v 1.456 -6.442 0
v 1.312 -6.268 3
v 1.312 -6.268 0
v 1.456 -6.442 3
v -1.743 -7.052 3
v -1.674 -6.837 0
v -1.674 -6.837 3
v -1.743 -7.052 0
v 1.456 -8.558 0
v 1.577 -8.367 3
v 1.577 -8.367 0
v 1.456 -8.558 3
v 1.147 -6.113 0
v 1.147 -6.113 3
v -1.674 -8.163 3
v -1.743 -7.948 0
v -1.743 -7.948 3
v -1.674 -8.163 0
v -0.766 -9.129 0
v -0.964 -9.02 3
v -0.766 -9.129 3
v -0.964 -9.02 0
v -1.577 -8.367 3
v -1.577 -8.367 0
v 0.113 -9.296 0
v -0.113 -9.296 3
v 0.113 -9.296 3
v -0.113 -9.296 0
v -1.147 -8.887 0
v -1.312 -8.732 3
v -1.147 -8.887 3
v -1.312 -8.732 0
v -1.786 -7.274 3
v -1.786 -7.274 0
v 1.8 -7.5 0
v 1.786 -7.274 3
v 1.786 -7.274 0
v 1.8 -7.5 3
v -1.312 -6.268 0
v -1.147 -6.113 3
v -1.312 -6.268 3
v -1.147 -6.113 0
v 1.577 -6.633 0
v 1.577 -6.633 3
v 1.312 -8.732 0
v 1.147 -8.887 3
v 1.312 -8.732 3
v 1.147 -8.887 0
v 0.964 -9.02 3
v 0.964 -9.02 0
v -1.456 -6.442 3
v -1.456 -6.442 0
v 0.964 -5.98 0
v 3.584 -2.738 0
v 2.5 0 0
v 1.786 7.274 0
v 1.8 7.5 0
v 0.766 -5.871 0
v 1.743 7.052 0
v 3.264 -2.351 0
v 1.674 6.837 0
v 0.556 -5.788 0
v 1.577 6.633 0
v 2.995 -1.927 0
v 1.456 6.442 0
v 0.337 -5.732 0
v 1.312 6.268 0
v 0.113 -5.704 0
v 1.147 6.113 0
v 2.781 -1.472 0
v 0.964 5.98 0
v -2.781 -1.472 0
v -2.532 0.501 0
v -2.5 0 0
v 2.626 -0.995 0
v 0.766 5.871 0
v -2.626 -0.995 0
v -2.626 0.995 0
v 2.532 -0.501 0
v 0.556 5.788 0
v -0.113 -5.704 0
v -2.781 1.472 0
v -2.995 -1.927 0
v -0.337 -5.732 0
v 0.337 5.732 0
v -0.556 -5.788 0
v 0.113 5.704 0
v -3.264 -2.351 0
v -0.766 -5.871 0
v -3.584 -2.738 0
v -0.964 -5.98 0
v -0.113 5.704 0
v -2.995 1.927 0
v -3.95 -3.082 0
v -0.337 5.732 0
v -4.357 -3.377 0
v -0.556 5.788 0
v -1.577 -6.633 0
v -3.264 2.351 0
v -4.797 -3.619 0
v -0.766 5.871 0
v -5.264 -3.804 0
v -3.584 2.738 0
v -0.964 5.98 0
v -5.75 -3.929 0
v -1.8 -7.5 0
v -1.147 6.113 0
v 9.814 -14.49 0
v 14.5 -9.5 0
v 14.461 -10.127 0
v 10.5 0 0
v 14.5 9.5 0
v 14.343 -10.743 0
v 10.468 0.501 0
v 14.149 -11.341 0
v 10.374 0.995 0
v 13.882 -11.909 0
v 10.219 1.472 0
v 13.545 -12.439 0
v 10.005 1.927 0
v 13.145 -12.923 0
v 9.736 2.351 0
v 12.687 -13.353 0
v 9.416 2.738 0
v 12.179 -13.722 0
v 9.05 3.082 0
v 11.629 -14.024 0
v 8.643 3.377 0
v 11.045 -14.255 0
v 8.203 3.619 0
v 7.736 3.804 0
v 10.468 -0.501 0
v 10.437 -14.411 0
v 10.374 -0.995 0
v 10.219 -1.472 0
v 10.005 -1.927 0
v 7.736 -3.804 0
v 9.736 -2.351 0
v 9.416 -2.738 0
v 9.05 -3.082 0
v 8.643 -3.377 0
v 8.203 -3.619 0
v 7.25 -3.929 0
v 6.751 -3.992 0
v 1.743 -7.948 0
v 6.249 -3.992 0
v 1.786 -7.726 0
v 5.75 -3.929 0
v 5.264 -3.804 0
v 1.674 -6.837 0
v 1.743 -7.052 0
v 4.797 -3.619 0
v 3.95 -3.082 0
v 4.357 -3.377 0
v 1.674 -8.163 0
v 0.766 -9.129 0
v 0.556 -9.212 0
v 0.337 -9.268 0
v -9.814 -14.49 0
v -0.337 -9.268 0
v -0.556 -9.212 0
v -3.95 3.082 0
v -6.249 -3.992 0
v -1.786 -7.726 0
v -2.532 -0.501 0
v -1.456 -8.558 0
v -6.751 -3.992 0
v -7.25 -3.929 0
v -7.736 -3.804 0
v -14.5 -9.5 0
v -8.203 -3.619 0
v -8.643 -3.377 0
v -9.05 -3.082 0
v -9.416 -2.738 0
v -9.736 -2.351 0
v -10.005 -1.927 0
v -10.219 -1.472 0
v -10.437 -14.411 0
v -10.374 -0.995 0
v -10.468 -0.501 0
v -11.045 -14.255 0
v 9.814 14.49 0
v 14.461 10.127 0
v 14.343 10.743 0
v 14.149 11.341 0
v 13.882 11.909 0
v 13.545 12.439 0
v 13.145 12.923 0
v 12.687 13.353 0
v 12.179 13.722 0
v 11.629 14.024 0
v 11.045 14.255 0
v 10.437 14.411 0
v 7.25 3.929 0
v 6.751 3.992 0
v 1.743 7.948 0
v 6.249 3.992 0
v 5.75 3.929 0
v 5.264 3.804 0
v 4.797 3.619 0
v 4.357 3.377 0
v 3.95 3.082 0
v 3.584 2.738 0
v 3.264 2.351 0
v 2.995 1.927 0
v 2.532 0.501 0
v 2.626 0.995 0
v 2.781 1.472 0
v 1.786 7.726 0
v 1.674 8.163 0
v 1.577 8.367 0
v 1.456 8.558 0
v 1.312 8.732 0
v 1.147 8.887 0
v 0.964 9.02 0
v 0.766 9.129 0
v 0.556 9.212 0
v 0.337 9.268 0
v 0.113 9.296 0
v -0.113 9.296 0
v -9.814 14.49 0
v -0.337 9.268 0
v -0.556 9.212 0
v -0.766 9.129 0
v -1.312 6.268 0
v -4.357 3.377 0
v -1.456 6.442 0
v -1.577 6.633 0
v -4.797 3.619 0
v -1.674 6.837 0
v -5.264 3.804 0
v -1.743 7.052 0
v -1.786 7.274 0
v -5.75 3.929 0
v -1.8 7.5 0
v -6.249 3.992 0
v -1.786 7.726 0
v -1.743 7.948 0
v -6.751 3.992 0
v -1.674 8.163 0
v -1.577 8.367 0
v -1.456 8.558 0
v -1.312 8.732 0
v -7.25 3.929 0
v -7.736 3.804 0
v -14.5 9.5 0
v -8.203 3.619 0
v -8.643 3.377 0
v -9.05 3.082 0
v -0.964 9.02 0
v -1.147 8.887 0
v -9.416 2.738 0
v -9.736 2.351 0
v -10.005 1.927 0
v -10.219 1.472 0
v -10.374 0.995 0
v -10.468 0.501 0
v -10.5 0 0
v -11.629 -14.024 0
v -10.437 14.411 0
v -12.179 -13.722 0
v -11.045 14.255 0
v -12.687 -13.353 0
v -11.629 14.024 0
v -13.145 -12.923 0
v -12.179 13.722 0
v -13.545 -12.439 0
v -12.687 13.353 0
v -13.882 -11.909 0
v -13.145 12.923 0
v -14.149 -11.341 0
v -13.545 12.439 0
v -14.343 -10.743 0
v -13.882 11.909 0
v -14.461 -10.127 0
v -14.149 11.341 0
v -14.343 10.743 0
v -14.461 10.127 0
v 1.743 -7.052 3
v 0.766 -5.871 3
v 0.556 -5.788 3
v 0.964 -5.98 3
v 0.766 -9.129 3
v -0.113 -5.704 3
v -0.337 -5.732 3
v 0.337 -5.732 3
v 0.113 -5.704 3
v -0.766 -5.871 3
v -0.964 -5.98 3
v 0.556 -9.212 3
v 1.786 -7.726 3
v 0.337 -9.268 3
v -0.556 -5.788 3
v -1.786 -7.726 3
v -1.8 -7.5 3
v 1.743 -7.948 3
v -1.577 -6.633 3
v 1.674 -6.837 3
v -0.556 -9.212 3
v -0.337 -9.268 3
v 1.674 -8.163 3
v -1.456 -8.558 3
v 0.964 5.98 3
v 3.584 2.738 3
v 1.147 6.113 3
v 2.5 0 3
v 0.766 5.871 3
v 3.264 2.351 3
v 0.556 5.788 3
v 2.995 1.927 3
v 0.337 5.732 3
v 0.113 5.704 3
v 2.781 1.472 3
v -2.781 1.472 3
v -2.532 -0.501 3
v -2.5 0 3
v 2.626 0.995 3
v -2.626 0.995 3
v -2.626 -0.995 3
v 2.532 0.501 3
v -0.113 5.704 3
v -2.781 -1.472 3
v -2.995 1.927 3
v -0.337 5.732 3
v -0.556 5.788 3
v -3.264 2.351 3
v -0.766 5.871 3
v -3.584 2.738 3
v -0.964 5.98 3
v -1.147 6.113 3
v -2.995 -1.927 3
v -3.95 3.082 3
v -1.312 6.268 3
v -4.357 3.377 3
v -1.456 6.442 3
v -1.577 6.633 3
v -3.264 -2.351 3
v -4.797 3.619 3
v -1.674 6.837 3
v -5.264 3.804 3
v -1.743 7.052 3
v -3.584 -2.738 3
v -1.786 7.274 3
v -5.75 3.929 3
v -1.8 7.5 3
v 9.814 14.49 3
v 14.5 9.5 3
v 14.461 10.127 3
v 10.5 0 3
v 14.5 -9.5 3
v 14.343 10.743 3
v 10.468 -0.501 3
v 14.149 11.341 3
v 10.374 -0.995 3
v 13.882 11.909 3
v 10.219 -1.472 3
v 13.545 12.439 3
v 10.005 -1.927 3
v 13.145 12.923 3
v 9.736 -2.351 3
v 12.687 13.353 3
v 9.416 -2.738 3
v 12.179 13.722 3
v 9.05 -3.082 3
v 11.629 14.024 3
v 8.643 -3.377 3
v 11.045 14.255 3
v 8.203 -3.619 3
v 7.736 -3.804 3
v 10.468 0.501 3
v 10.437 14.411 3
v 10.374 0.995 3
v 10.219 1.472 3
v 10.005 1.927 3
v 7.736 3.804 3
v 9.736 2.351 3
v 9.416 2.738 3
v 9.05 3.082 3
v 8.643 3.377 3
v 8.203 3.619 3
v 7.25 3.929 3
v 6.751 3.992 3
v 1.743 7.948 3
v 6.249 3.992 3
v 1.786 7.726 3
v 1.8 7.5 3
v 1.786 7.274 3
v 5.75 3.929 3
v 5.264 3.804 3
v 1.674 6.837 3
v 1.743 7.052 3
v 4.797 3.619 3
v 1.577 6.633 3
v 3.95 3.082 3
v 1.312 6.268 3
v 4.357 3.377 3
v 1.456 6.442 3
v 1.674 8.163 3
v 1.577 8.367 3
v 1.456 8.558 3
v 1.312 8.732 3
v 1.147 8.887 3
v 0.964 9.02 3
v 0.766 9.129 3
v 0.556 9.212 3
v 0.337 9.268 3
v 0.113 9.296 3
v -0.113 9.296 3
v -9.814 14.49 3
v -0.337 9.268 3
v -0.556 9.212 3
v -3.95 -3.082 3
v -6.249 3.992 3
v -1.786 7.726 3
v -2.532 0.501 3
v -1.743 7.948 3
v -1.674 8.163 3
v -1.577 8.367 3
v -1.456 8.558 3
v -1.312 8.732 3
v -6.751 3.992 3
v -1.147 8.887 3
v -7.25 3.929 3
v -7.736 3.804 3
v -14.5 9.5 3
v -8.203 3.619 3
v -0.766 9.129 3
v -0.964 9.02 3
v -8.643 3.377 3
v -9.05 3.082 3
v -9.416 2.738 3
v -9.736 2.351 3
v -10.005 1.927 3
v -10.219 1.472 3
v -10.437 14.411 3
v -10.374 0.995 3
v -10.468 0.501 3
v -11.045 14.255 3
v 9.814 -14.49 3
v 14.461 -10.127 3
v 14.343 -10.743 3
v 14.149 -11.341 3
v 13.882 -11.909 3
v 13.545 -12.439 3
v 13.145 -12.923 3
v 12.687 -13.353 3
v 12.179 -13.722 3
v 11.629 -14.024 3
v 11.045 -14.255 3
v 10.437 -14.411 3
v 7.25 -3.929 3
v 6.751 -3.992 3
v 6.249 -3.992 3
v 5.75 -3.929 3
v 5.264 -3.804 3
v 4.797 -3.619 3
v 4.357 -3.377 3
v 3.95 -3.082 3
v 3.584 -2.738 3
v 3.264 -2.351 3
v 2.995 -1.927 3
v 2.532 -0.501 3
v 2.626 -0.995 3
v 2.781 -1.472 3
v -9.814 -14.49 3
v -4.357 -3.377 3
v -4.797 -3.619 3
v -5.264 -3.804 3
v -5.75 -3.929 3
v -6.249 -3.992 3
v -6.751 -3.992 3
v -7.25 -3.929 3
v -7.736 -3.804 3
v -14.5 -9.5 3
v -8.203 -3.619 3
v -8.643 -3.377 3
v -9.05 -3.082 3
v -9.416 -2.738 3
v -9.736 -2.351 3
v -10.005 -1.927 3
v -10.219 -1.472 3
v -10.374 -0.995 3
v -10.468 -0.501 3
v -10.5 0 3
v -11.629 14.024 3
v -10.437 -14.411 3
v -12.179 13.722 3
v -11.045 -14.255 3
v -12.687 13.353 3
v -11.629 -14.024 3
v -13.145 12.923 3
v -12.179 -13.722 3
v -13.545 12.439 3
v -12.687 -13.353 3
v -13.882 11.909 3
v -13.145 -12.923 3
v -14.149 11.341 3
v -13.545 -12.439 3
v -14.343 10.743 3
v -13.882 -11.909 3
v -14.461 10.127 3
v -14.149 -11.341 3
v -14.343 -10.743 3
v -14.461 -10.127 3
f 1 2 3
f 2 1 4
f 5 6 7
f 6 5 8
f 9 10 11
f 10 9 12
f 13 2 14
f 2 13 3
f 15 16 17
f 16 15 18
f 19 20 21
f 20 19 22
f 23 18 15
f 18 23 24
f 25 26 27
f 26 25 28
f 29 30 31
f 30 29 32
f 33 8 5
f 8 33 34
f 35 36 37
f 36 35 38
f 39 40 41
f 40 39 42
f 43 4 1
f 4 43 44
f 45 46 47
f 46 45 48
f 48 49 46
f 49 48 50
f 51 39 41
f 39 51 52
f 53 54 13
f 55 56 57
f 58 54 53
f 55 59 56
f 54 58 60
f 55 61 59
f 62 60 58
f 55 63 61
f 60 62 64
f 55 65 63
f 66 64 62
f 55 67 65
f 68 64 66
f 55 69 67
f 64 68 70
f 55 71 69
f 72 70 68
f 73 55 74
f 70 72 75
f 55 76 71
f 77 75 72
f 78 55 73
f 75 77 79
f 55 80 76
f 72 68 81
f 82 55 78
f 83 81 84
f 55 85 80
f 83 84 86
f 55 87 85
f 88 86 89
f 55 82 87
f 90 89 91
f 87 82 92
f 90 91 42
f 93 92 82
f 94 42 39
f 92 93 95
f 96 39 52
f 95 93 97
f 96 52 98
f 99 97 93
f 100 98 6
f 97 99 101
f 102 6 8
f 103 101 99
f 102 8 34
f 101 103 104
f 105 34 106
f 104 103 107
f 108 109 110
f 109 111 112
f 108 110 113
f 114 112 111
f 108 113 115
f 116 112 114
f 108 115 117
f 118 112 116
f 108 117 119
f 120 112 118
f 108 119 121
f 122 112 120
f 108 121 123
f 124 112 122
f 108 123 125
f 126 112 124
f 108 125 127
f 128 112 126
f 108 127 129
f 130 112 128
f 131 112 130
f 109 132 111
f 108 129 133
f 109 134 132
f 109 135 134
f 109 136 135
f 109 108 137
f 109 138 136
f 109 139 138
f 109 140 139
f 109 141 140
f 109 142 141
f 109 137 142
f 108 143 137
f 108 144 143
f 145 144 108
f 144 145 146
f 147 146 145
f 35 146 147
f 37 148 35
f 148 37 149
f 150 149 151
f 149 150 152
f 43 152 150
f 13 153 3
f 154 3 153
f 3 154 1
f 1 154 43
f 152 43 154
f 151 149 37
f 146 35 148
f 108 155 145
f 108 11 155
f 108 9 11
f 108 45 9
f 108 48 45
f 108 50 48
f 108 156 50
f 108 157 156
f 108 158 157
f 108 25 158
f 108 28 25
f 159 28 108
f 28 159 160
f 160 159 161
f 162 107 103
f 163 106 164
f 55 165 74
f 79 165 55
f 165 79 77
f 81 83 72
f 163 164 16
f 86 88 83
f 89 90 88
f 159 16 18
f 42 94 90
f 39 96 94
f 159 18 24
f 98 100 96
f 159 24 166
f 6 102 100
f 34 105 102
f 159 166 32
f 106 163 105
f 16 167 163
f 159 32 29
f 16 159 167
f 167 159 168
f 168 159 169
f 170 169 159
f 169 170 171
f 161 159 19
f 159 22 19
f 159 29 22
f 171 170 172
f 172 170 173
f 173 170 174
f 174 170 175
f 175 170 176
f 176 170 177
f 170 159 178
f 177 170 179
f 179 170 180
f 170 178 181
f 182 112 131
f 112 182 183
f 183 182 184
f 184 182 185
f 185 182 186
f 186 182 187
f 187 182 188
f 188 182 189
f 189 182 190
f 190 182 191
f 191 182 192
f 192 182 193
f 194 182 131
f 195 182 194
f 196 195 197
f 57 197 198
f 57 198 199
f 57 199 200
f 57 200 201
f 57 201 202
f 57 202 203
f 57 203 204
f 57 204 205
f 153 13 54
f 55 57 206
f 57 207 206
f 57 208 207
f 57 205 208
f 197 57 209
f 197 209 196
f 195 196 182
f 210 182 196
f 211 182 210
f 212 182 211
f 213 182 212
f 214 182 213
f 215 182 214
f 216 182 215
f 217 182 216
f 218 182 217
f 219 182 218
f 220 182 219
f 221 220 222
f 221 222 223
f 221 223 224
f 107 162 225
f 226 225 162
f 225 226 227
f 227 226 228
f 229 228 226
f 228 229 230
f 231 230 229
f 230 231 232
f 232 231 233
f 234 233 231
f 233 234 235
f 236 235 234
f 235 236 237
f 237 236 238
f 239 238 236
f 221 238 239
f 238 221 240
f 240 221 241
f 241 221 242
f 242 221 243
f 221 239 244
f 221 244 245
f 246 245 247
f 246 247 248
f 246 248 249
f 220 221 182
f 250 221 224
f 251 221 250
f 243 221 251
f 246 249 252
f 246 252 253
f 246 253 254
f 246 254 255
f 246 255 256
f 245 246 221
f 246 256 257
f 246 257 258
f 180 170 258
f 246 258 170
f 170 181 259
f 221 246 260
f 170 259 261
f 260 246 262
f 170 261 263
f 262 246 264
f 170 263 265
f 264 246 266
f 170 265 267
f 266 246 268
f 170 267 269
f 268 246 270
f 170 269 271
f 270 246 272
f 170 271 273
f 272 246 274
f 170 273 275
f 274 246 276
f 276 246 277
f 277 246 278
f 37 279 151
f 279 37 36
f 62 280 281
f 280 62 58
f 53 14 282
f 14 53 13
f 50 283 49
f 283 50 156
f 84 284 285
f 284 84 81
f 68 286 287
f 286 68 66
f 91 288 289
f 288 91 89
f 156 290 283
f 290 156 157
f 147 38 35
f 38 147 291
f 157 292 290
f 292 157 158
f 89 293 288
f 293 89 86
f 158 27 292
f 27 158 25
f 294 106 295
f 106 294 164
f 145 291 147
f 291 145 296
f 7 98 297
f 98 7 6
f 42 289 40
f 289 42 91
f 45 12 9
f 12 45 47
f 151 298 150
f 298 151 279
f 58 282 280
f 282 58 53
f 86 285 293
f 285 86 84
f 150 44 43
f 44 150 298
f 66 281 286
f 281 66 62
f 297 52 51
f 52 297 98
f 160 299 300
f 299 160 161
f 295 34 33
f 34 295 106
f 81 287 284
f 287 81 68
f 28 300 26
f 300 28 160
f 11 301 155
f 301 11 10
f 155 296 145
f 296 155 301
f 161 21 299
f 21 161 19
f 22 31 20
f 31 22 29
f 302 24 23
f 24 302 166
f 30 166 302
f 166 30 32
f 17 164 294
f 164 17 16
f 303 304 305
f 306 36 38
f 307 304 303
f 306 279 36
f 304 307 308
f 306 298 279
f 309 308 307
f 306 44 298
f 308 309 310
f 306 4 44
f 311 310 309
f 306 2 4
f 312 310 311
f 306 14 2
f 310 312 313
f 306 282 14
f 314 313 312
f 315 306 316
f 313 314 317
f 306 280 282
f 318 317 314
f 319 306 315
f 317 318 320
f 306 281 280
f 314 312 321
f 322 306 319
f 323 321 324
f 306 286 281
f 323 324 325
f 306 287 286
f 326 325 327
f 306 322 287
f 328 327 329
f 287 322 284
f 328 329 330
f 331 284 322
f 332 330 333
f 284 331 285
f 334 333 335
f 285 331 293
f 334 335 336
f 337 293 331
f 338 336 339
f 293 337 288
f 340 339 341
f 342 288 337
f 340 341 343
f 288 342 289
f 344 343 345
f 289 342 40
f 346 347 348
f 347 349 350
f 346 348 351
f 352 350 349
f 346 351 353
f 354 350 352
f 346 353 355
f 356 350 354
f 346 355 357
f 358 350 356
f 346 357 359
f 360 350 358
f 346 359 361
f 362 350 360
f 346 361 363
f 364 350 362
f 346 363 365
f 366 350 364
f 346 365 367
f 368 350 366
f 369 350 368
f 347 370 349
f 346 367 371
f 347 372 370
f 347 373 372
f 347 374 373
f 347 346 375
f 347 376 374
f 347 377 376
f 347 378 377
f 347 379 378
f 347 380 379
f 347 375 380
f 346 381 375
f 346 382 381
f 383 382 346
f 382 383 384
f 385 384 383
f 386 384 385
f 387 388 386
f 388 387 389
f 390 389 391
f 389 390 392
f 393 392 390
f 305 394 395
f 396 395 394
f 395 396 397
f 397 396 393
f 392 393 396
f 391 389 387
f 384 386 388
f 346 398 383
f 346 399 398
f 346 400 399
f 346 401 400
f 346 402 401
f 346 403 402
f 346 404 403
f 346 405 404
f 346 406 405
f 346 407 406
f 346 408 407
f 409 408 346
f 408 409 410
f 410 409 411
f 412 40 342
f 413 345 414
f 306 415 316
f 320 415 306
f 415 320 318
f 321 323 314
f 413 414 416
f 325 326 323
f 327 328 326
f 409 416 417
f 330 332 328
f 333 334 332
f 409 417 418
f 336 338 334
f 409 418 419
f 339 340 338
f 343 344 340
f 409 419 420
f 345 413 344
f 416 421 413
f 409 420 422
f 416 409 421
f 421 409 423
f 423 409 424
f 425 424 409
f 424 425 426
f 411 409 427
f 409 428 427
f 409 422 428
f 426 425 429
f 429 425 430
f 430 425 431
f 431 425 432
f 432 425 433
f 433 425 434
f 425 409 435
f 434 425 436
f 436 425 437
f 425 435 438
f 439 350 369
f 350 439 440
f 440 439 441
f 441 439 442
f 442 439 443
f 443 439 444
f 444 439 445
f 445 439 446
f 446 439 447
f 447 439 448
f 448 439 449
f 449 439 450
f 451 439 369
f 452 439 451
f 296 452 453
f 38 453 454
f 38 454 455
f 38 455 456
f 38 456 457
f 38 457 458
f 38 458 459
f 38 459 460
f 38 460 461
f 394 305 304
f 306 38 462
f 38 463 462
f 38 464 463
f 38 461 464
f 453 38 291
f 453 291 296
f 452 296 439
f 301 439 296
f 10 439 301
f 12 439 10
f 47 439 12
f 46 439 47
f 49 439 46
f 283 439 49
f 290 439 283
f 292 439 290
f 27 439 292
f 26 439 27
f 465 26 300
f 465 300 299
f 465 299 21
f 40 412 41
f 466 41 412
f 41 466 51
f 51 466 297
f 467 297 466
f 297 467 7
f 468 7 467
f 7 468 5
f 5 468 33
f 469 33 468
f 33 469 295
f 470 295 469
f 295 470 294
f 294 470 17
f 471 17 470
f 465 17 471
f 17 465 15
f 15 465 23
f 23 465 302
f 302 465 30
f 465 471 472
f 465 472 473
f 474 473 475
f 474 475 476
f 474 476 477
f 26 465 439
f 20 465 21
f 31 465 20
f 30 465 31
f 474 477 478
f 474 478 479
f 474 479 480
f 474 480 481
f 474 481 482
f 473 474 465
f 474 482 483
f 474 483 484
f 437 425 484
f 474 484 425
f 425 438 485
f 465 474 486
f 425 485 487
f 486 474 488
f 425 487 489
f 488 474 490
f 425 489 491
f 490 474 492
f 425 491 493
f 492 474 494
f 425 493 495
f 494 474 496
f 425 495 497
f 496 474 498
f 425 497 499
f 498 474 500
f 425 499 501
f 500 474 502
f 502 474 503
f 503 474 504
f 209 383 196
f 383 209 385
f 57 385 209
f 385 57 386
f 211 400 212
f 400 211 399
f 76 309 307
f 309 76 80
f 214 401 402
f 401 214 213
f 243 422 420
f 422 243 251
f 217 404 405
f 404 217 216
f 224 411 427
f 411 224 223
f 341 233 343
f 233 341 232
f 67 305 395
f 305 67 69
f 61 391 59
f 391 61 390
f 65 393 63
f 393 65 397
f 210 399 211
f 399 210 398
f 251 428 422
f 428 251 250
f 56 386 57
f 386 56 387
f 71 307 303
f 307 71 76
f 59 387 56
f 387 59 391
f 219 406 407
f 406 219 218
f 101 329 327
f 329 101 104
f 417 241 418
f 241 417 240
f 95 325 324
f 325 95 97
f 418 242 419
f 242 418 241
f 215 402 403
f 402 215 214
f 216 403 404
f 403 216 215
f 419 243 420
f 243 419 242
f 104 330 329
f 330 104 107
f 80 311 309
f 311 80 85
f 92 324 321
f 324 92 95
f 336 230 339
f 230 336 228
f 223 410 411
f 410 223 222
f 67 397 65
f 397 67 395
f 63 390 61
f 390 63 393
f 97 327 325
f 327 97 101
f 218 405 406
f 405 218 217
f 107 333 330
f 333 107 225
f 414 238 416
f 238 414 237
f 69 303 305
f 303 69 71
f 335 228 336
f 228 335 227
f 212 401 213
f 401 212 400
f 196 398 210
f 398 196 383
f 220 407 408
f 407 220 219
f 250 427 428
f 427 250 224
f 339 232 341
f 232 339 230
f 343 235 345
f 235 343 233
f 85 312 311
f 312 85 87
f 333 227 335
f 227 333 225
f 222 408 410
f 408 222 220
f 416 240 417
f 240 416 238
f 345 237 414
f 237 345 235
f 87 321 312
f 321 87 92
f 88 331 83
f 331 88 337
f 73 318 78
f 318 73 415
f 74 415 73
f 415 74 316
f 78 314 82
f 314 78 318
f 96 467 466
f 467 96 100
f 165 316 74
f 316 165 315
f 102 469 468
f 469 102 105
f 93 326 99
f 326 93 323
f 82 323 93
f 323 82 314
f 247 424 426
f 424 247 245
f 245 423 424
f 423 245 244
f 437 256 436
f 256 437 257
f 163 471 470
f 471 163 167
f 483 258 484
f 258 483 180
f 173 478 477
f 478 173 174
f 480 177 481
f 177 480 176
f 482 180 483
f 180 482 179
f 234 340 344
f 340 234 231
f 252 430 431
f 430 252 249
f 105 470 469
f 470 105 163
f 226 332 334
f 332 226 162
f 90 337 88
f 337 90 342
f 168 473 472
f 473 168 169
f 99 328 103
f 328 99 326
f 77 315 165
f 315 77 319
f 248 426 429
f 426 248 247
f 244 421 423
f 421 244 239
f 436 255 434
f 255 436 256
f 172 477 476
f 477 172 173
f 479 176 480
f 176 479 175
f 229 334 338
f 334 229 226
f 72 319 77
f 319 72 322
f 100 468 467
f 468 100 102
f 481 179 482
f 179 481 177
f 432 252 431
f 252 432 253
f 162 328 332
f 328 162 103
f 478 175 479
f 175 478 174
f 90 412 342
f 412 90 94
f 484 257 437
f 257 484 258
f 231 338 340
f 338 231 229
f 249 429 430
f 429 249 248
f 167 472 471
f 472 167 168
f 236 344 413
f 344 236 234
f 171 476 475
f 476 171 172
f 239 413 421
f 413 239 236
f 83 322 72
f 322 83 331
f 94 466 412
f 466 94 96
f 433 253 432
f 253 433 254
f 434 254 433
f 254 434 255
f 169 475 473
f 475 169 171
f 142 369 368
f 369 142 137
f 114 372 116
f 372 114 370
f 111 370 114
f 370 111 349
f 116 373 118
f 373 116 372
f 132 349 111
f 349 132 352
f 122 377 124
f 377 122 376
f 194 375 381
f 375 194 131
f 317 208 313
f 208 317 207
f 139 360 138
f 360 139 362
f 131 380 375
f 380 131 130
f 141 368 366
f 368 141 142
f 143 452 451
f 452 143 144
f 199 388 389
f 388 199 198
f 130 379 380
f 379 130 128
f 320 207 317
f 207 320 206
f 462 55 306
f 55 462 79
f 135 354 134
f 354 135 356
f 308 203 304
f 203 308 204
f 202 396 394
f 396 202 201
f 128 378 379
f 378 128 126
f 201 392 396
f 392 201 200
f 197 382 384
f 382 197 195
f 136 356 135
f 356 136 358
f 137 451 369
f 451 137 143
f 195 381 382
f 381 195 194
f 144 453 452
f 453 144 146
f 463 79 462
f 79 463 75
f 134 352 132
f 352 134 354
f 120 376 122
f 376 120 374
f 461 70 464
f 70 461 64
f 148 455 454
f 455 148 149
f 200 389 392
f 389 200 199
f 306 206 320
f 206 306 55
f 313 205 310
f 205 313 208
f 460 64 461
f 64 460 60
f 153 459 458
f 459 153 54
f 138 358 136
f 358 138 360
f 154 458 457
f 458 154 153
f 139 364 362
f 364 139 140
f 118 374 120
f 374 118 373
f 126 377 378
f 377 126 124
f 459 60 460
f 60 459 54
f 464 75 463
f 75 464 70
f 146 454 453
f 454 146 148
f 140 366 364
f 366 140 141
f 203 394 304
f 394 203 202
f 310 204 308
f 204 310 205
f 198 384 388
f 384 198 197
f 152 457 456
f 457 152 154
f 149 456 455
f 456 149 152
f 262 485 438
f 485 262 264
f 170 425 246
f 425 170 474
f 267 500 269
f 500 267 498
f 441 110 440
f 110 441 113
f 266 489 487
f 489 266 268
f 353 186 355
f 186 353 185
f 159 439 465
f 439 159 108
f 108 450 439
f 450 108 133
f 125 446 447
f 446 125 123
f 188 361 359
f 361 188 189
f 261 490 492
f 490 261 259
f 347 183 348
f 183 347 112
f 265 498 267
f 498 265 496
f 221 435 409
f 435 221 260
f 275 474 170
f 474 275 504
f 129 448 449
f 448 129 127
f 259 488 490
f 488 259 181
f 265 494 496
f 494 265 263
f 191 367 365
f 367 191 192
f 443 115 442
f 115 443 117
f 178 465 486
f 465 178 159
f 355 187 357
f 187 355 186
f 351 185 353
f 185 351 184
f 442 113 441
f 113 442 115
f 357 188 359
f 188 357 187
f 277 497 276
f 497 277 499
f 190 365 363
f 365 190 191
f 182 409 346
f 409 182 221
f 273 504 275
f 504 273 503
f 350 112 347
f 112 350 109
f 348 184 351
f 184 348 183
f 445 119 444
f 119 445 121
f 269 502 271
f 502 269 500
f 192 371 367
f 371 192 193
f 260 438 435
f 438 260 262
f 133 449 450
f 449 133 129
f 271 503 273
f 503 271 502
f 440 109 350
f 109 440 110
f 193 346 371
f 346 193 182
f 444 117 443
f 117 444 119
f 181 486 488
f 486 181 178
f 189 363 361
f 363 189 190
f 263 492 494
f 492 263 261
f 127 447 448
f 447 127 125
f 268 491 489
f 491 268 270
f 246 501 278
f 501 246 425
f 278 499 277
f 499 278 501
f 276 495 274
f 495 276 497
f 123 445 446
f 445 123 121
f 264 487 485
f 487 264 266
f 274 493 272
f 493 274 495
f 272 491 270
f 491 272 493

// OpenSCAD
$fn = 50;

difference() {
	union() {
		hull() {
			translate(v = [-9.5, 9.5, 0]) {
				cylinder(h = 3, r = 5);
			}
			translate(v = [9.5, 9.5, 0]) {
				cylinder(h = 3, r = 5);
			}
			translate(v = [-9.5, -9.5, 0]) {
				cylinder(h = 3, r = 5);
			}
			translate(v = [9.5, -9.5, 0]) {
				cylinder(h = 3, r = 5);
			}
		}
	}
	union() {
		translate(v = [0.0, -7.5, 0]) {
			cylinder(h = 3, r = 1.8);
		}
		translate(v = [0.0, 7.5, 0]) {
			cylinder(h = 3, r = 1.8);
		}
		translate(v = [-6.5, 0, 0.0]) {
			cylinder(h = 3, r = 4.0);
		}
		translate(v = [6.5, 0, 0.0]) {
			cylinder(h = 3, r = 4.0);
		}
	}
}
